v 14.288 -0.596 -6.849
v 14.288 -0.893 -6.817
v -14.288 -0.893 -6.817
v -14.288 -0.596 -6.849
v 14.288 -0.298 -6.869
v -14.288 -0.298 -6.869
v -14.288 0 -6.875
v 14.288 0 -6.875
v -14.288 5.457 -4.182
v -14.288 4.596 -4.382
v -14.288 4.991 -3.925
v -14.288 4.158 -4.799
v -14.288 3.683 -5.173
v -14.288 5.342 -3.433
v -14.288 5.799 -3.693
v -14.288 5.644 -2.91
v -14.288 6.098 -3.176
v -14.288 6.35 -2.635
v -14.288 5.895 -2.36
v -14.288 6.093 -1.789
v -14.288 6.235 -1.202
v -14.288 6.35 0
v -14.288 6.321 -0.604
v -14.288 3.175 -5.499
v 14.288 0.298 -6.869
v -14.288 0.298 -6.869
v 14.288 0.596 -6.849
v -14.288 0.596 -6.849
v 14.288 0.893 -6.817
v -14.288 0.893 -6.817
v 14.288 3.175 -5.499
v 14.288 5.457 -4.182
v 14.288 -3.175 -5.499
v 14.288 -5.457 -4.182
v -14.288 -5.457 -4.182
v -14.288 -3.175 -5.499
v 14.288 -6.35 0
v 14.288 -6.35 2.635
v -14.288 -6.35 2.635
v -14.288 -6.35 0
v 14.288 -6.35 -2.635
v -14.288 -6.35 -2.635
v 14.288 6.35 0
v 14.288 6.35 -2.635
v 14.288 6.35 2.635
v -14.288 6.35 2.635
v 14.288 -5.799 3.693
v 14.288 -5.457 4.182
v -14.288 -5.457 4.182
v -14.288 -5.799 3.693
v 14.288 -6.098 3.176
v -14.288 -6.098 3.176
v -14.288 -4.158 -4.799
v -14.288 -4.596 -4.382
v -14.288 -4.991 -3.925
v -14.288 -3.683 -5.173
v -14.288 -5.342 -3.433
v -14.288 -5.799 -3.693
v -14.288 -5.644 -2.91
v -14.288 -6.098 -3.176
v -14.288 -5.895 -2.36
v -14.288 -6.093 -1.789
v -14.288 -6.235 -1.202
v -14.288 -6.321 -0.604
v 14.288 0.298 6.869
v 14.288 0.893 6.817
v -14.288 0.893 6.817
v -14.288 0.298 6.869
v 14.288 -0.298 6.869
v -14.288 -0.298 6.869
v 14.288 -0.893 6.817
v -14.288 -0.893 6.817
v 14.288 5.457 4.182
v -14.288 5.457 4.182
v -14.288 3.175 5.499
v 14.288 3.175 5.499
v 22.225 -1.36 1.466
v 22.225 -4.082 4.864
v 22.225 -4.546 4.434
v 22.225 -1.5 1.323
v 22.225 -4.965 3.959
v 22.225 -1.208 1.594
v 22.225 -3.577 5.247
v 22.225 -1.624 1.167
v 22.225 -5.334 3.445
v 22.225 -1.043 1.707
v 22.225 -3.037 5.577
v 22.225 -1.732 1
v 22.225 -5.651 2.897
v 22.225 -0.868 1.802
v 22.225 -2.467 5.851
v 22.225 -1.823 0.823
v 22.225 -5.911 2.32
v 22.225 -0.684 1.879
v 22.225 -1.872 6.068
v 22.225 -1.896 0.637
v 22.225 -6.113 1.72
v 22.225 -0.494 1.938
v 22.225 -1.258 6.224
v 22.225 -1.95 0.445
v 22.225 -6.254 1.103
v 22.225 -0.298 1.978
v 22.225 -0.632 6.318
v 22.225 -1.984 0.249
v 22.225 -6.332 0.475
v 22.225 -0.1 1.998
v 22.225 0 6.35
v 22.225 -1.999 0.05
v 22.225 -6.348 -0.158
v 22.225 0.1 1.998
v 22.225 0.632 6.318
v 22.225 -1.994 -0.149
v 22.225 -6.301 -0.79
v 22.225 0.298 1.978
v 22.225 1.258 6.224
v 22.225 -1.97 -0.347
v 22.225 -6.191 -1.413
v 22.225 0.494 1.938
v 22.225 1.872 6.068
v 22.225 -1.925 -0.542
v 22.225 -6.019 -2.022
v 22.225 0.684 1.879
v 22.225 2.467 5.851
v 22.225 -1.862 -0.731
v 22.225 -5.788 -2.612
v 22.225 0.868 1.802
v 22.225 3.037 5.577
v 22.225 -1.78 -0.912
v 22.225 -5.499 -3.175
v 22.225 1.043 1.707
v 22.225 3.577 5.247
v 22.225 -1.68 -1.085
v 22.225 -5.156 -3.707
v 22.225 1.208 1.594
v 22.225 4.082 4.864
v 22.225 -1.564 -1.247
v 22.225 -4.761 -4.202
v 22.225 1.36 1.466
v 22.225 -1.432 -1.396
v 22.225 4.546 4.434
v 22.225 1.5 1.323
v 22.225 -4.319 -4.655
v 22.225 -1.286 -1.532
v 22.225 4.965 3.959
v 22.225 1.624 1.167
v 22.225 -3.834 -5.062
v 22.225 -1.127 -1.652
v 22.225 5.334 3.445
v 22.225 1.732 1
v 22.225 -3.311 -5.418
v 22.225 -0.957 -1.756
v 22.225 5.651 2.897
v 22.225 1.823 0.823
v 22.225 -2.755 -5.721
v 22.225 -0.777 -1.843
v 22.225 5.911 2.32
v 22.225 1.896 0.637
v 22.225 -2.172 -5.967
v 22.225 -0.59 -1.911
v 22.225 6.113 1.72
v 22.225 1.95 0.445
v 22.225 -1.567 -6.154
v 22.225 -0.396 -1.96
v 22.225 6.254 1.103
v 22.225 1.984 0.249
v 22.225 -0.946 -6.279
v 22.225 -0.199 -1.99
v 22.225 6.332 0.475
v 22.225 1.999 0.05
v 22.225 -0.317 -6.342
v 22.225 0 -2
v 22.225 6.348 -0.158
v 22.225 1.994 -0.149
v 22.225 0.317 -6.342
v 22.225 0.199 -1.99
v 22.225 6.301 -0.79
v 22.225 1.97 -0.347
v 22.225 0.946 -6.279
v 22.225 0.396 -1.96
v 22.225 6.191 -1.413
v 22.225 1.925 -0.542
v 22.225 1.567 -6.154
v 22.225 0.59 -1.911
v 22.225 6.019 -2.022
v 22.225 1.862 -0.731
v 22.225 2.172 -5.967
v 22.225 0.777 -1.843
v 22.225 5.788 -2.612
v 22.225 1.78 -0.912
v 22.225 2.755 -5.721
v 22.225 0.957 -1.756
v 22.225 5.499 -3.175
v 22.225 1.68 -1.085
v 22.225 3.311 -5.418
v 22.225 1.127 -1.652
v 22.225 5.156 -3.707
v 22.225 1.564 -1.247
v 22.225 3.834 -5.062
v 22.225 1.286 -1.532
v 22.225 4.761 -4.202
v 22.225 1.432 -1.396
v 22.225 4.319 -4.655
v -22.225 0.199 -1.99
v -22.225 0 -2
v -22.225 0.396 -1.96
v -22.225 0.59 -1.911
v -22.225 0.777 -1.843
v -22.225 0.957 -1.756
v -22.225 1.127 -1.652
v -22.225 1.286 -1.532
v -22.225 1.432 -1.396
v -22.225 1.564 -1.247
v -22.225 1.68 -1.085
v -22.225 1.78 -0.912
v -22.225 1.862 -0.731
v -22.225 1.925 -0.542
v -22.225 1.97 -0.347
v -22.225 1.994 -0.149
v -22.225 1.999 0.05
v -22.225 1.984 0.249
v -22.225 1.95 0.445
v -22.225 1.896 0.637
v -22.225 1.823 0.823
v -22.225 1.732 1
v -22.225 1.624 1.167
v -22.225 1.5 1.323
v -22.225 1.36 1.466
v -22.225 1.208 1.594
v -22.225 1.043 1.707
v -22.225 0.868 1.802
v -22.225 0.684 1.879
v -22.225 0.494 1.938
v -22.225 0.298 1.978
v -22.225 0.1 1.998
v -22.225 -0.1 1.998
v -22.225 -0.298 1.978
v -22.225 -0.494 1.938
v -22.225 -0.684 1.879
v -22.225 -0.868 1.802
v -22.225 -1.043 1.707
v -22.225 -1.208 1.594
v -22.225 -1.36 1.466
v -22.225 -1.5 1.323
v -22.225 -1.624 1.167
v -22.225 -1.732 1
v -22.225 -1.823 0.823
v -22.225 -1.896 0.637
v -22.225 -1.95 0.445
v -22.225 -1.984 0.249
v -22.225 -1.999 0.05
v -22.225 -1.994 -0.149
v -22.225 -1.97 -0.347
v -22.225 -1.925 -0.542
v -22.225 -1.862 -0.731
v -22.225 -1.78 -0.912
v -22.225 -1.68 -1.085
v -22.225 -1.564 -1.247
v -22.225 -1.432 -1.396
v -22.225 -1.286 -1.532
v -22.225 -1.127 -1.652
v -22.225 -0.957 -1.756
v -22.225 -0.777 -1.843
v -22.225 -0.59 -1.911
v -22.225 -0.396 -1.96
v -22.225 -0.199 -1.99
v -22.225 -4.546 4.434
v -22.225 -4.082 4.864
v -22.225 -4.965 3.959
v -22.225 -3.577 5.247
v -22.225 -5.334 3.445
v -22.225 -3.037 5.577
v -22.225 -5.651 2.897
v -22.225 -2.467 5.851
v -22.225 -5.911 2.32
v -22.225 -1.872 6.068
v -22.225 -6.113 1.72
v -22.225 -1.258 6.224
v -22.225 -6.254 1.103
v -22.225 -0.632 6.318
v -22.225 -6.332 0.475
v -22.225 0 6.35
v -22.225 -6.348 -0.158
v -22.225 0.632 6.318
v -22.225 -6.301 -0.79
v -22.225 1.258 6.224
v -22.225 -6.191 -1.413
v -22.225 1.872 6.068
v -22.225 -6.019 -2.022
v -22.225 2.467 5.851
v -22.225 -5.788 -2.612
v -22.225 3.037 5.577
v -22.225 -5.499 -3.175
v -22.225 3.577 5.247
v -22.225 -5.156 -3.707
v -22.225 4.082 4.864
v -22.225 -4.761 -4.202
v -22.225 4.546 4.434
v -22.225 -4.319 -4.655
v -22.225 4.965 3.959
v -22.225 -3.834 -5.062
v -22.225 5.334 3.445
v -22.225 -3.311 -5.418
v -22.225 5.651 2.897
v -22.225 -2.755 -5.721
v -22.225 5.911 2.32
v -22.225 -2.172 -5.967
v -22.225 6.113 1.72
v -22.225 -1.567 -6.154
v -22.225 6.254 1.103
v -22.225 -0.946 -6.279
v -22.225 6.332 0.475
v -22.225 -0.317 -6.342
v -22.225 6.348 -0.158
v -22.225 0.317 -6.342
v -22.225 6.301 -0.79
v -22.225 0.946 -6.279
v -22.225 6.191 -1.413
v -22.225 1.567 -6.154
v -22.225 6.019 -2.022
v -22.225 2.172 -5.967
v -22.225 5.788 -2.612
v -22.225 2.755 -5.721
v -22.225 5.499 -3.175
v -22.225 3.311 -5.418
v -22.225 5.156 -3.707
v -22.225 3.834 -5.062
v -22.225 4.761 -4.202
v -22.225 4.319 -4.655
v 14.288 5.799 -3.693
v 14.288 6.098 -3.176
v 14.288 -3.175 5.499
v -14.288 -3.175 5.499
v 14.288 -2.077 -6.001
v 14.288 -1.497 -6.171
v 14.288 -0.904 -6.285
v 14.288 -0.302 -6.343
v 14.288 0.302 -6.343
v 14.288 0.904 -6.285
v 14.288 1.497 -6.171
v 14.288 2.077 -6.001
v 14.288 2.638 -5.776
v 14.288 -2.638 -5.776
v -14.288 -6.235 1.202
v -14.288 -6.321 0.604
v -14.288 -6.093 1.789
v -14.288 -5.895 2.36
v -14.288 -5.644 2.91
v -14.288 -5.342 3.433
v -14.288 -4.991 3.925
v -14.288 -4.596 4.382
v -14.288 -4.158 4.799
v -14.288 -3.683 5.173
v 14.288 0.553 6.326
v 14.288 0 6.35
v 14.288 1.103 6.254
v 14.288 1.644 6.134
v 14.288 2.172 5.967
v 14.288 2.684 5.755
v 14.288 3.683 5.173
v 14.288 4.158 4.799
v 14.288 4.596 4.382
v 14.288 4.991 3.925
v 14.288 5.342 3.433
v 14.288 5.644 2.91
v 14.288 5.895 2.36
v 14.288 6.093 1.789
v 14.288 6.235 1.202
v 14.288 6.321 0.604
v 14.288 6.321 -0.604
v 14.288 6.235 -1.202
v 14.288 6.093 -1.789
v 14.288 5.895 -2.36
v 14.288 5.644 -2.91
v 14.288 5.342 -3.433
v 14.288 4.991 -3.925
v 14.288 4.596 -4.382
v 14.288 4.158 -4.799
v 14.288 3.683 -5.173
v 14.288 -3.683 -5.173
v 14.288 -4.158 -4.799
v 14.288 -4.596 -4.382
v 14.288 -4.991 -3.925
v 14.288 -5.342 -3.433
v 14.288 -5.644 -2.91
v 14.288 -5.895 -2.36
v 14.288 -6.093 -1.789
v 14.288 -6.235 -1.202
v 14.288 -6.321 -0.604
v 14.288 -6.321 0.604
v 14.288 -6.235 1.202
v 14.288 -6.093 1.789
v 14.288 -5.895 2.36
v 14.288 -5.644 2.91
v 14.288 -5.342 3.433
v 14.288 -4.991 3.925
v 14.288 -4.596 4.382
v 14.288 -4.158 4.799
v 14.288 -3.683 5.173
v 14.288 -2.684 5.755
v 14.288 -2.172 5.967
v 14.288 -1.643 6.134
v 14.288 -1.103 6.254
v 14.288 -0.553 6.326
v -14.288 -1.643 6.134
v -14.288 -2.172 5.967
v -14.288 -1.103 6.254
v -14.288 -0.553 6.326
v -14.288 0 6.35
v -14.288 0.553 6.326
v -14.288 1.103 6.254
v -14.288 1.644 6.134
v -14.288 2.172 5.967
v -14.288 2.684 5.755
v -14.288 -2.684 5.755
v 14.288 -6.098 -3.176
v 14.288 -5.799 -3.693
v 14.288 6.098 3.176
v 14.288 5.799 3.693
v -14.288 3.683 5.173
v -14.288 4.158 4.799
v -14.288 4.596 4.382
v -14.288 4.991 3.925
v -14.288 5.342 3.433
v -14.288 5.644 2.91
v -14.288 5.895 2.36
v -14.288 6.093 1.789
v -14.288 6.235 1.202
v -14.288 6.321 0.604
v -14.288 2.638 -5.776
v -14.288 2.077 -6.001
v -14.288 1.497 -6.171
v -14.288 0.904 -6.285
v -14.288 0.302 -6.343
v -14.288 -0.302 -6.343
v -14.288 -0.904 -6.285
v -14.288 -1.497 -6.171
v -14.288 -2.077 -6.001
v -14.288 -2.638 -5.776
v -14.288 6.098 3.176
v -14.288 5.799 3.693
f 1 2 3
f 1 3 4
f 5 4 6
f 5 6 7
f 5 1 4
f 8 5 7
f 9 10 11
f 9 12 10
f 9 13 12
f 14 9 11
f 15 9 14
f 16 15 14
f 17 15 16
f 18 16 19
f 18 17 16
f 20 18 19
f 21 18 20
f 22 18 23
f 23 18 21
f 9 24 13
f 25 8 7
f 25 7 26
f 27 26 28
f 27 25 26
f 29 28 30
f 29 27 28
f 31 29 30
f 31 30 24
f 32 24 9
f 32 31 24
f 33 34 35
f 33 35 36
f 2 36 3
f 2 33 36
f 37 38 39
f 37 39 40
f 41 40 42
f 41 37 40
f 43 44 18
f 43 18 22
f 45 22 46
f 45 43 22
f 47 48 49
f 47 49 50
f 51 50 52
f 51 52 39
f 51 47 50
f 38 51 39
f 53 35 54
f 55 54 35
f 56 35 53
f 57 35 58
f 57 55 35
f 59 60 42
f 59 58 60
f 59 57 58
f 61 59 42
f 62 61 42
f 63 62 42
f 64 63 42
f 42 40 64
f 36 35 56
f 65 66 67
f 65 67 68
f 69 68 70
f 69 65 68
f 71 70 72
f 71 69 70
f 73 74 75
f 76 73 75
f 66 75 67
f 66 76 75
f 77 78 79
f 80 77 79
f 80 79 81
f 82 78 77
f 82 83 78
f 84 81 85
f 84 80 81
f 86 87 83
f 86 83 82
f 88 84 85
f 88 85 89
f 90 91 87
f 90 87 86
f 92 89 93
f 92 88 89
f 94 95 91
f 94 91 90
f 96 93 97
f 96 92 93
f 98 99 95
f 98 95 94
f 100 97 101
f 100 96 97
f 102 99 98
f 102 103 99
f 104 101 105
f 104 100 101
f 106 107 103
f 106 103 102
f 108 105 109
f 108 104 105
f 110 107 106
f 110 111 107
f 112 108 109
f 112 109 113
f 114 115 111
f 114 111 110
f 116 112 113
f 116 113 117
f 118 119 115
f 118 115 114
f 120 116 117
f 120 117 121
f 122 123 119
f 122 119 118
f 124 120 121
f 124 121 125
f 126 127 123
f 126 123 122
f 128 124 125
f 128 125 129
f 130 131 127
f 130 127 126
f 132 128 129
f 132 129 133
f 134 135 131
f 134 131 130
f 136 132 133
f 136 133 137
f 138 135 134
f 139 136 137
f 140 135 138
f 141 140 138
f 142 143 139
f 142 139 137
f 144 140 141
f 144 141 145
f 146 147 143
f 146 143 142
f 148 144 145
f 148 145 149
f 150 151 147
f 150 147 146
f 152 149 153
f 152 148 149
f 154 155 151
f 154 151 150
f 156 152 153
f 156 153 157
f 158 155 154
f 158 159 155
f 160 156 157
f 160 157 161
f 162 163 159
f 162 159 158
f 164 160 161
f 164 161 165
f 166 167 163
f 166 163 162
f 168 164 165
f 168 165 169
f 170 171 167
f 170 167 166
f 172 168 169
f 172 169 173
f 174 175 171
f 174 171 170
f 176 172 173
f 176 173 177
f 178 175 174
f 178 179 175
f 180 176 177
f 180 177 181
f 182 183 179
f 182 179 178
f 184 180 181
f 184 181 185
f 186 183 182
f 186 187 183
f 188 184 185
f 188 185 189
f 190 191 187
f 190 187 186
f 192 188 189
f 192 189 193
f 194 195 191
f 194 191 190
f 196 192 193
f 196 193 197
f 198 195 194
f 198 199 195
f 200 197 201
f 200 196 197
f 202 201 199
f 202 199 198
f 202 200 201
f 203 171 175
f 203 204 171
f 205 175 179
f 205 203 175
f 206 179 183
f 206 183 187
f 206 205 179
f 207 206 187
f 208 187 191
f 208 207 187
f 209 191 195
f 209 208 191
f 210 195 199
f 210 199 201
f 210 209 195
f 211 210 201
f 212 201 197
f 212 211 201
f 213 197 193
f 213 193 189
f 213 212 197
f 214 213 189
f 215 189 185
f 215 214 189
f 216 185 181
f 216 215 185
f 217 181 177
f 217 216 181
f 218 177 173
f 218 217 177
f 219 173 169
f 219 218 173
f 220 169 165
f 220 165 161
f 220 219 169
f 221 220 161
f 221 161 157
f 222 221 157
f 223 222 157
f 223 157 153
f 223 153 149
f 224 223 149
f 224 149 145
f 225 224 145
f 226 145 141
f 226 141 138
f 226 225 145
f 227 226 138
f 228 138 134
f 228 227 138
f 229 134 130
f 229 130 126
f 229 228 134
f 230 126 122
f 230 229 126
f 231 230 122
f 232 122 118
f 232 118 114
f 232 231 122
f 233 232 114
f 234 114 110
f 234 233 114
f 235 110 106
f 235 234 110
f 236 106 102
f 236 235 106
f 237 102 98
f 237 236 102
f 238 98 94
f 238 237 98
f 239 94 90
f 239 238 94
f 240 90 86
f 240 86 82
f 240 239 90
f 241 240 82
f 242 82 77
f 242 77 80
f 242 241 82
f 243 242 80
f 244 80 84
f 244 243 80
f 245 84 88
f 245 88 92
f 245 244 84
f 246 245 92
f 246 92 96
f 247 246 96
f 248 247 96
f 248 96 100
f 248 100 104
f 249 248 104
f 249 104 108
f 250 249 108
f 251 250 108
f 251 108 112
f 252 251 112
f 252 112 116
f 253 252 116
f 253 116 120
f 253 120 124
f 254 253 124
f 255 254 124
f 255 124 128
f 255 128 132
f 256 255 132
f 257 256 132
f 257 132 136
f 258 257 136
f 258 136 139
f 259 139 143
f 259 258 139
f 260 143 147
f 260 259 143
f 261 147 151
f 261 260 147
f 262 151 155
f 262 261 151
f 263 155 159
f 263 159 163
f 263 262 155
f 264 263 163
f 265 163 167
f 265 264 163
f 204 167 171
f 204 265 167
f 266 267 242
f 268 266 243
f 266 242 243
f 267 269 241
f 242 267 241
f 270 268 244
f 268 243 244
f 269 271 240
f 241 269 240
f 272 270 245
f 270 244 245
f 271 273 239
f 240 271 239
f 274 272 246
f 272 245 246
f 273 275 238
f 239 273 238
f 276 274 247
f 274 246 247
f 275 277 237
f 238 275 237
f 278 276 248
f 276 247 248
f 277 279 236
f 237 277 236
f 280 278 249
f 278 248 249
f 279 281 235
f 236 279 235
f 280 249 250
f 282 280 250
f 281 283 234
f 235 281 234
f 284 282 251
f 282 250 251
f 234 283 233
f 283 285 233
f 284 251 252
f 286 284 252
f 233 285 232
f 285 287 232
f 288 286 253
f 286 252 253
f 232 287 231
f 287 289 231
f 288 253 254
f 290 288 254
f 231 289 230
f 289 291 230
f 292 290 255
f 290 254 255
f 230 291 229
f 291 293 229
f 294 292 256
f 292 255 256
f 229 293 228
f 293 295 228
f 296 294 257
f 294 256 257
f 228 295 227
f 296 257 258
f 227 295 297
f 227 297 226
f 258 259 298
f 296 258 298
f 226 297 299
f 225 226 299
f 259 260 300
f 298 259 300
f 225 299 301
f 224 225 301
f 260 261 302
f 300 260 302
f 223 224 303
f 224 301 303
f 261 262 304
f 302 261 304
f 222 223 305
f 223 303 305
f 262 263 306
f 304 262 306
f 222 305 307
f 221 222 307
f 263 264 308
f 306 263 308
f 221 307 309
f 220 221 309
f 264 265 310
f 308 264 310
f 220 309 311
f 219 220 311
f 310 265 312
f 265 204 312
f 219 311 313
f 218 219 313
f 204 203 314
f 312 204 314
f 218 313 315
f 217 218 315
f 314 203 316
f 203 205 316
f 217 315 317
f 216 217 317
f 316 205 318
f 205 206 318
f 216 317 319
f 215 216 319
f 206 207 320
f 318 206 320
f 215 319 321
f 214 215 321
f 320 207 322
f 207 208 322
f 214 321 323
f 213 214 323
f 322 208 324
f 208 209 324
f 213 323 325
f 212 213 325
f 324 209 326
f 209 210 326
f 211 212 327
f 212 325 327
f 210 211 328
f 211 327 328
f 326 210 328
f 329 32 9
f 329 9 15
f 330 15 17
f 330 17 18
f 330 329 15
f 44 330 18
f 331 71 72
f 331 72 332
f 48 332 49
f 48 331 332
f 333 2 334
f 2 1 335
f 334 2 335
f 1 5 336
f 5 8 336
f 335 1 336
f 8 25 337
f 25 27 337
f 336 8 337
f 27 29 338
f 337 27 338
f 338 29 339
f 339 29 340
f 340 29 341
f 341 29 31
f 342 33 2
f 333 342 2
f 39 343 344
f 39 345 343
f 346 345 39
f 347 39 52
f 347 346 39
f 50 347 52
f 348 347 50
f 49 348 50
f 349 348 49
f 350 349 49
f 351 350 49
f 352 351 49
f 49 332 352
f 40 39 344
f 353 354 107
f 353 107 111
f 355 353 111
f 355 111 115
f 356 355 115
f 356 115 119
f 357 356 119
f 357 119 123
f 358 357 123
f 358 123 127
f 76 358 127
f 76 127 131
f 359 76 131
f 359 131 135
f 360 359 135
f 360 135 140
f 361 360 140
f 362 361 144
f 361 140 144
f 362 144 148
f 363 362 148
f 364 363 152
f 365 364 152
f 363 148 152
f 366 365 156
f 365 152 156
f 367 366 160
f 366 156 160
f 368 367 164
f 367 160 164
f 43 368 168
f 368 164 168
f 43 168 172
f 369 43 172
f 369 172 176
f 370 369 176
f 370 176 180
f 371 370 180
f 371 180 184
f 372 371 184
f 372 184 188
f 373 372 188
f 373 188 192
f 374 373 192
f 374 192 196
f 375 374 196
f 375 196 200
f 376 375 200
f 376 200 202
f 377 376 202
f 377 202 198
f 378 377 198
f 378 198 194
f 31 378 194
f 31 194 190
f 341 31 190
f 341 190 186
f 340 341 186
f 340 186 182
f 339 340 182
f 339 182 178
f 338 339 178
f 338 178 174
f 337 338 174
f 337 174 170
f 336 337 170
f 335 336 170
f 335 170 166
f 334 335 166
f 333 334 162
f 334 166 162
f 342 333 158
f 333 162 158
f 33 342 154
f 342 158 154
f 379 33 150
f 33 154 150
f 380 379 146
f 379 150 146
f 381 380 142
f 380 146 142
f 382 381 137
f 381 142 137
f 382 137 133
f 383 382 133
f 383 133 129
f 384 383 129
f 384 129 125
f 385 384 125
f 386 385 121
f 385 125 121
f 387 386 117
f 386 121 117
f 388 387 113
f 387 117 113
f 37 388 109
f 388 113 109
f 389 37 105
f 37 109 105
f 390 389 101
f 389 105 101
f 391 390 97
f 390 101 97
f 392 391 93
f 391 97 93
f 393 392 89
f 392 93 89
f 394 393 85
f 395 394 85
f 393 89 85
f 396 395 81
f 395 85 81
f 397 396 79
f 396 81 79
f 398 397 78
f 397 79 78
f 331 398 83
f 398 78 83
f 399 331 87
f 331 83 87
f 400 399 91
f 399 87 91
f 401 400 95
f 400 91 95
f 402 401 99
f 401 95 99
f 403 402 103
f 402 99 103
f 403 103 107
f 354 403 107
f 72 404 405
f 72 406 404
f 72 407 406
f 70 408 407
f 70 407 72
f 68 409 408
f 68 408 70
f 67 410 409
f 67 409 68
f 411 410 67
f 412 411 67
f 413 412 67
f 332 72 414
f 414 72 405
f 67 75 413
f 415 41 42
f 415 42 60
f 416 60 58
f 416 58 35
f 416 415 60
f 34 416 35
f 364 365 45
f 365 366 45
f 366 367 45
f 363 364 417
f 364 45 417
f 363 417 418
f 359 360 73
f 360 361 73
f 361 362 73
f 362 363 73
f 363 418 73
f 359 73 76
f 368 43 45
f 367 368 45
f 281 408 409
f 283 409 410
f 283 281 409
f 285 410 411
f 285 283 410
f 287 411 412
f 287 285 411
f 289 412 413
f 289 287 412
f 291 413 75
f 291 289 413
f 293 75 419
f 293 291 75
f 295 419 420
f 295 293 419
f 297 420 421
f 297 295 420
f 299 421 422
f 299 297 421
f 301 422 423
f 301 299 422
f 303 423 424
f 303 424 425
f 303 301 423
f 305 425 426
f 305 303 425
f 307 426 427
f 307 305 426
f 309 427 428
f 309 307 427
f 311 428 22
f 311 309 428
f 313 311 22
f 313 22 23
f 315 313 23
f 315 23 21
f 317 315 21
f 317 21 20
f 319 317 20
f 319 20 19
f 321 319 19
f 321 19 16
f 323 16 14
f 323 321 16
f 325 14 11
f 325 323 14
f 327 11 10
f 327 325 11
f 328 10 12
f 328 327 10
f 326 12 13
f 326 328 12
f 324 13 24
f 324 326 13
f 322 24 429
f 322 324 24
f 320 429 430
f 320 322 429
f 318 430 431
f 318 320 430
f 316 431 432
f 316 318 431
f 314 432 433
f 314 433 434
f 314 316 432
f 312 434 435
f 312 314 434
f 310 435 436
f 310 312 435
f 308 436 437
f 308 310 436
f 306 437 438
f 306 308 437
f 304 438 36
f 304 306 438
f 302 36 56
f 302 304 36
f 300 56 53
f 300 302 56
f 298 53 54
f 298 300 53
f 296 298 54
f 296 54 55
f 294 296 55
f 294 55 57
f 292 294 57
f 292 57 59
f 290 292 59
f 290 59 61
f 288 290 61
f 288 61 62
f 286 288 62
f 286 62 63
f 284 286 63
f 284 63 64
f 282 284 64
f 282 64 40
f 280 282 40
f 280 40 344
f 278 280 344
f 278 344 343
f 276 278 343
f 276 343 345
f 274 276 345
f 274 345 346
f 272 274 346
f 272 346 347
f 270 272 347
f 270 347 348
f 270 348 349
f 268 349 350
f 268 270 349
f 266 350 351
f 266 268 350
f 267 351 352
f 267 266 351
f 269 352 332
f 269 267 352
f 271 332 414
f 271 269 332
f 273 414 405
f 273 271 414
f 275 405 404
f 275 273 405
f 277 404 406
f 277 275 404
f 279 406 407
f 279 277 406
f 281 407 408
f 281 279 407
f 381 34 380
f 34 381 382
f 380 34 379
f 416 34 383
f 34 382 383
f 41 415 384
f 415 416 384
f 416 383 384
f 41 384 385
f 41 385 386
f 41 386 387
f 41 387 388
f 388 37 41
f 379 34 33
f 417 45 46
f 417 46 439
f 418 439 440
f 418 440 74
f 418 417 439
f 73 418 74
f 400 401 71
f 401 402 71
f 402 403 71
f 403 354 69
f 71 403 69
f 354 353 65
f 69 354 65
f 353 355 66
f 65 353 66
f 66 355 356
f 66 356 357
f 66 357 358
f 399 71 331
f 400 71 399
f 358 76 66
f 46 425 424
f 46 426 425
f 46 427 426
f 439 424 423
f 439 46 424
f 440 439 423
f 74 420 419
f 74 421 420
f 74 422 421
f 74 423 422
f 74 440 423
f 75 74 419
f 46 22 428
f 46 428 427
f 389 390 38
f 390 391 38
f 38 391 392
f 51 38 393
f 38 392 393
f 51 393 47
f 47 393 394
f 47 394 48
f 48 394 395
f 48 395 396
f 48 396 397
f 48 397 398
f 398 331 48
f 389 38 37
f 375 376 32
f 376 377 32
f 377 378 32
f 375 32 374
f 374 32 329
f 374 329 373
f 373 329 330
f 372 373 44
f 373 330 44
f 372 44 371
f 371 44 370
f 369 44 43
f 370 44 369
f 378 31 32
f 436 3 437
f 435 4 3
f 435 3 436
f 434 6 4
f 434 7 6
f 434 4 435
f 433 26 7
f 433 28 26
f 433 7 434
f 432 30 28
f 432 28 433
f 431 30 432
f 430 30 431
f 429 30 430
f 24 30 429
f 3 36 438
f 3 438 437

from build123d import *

# Parameters (mm, degrees)
SKETCH1_R               = 2.000000064
BOSS_EXTRUDE1_DEPTH     = 22.225
SKETCH4_R               = 8.89
SKETCH4_R_2             = 6.35
CUT_EXTRUDE_THIN1_DEPTH = 7.9375


with BuildPart() as part:
    # Sketch1 → Boss-Extrude1 (new, symmetric)
    with BuildSketch(Plane(origin=(0, 0, 0), x_dir=(0, 0, -1), z_dir=(1, 0, 0))):
        with BuildLine():
            ThreePointArc((6.874999966, 0), (6.860422465, 0.447468582), (6.816751782, 0.893039571))
            Line((6.816751782, 0.893039571), (4.181770846, 5.456960429))
            ThreePointArc((4.181770846, 5.456960429), (3.437499983, 5.953924622), (2.634980936, 6.35))
            Line((2.634980936, 6.35), (-2.634980936, 6.35))
            ThreePointArc((-2.634980936, 6.35), (-3.437499983, 5.953924622), (-4.181770846, 5.456960429))
            Line((-4.181770846, 5.456960429), (-6.816751782, 0.893039571))
            ThreePointArc((-6.816751782, 0.893039571), (-6.874999966, 0), (-6.816751782, -0.893039571))
            Line((-6.816751782, -0.893039571), (-4.181770846, -5.456960429))
            ThreePointArc((-4.181770846, -5.456960429), (-3.437499983, -5.953924622), (-2.634980936, -6.35))
            Line((-2.634980936, -6.35), (2.634980936, -6.35))
            ThreePointArc((2.634980936, -6.35), (3.437499983, -5.953924622), (4.181770846, -5.456960429))
            Line((4.181770846, -5.456960429), (6.816751782, -0.893039571))
            ThreePointArc((6.816751782, -0.893039571), (6.860422465, -0.447468582), (6.874999966, 0))
        make_face()
        Circle(SKETCH1_R, mode=Mode.SUBTRACT)
    extrude(amount=BOSS_EXTRUDE1_DEPTH, both=True)

    # Sketch4 → Cut-Extrude-Thin1 (cut)
    with BuildSketch(Plane.ZY.offset(22.225)):
        Circle(SKETCH4_R)
        Circle(SKETCH4_R_2, mode=Mode.SUBTRACT)
    cut_extrude_thin1 = extrude(amount=-CUT_EXTRUDE_THIN1_DEPTH, mode=Mode.SUBTRACT)

    # Mirror1: Cut-Extrude-Thin1 across plane
    add(cut_extrude_thin1.mirror(Plane.ZY), mode=Mode.SUBTRACT)


solid = part.part
